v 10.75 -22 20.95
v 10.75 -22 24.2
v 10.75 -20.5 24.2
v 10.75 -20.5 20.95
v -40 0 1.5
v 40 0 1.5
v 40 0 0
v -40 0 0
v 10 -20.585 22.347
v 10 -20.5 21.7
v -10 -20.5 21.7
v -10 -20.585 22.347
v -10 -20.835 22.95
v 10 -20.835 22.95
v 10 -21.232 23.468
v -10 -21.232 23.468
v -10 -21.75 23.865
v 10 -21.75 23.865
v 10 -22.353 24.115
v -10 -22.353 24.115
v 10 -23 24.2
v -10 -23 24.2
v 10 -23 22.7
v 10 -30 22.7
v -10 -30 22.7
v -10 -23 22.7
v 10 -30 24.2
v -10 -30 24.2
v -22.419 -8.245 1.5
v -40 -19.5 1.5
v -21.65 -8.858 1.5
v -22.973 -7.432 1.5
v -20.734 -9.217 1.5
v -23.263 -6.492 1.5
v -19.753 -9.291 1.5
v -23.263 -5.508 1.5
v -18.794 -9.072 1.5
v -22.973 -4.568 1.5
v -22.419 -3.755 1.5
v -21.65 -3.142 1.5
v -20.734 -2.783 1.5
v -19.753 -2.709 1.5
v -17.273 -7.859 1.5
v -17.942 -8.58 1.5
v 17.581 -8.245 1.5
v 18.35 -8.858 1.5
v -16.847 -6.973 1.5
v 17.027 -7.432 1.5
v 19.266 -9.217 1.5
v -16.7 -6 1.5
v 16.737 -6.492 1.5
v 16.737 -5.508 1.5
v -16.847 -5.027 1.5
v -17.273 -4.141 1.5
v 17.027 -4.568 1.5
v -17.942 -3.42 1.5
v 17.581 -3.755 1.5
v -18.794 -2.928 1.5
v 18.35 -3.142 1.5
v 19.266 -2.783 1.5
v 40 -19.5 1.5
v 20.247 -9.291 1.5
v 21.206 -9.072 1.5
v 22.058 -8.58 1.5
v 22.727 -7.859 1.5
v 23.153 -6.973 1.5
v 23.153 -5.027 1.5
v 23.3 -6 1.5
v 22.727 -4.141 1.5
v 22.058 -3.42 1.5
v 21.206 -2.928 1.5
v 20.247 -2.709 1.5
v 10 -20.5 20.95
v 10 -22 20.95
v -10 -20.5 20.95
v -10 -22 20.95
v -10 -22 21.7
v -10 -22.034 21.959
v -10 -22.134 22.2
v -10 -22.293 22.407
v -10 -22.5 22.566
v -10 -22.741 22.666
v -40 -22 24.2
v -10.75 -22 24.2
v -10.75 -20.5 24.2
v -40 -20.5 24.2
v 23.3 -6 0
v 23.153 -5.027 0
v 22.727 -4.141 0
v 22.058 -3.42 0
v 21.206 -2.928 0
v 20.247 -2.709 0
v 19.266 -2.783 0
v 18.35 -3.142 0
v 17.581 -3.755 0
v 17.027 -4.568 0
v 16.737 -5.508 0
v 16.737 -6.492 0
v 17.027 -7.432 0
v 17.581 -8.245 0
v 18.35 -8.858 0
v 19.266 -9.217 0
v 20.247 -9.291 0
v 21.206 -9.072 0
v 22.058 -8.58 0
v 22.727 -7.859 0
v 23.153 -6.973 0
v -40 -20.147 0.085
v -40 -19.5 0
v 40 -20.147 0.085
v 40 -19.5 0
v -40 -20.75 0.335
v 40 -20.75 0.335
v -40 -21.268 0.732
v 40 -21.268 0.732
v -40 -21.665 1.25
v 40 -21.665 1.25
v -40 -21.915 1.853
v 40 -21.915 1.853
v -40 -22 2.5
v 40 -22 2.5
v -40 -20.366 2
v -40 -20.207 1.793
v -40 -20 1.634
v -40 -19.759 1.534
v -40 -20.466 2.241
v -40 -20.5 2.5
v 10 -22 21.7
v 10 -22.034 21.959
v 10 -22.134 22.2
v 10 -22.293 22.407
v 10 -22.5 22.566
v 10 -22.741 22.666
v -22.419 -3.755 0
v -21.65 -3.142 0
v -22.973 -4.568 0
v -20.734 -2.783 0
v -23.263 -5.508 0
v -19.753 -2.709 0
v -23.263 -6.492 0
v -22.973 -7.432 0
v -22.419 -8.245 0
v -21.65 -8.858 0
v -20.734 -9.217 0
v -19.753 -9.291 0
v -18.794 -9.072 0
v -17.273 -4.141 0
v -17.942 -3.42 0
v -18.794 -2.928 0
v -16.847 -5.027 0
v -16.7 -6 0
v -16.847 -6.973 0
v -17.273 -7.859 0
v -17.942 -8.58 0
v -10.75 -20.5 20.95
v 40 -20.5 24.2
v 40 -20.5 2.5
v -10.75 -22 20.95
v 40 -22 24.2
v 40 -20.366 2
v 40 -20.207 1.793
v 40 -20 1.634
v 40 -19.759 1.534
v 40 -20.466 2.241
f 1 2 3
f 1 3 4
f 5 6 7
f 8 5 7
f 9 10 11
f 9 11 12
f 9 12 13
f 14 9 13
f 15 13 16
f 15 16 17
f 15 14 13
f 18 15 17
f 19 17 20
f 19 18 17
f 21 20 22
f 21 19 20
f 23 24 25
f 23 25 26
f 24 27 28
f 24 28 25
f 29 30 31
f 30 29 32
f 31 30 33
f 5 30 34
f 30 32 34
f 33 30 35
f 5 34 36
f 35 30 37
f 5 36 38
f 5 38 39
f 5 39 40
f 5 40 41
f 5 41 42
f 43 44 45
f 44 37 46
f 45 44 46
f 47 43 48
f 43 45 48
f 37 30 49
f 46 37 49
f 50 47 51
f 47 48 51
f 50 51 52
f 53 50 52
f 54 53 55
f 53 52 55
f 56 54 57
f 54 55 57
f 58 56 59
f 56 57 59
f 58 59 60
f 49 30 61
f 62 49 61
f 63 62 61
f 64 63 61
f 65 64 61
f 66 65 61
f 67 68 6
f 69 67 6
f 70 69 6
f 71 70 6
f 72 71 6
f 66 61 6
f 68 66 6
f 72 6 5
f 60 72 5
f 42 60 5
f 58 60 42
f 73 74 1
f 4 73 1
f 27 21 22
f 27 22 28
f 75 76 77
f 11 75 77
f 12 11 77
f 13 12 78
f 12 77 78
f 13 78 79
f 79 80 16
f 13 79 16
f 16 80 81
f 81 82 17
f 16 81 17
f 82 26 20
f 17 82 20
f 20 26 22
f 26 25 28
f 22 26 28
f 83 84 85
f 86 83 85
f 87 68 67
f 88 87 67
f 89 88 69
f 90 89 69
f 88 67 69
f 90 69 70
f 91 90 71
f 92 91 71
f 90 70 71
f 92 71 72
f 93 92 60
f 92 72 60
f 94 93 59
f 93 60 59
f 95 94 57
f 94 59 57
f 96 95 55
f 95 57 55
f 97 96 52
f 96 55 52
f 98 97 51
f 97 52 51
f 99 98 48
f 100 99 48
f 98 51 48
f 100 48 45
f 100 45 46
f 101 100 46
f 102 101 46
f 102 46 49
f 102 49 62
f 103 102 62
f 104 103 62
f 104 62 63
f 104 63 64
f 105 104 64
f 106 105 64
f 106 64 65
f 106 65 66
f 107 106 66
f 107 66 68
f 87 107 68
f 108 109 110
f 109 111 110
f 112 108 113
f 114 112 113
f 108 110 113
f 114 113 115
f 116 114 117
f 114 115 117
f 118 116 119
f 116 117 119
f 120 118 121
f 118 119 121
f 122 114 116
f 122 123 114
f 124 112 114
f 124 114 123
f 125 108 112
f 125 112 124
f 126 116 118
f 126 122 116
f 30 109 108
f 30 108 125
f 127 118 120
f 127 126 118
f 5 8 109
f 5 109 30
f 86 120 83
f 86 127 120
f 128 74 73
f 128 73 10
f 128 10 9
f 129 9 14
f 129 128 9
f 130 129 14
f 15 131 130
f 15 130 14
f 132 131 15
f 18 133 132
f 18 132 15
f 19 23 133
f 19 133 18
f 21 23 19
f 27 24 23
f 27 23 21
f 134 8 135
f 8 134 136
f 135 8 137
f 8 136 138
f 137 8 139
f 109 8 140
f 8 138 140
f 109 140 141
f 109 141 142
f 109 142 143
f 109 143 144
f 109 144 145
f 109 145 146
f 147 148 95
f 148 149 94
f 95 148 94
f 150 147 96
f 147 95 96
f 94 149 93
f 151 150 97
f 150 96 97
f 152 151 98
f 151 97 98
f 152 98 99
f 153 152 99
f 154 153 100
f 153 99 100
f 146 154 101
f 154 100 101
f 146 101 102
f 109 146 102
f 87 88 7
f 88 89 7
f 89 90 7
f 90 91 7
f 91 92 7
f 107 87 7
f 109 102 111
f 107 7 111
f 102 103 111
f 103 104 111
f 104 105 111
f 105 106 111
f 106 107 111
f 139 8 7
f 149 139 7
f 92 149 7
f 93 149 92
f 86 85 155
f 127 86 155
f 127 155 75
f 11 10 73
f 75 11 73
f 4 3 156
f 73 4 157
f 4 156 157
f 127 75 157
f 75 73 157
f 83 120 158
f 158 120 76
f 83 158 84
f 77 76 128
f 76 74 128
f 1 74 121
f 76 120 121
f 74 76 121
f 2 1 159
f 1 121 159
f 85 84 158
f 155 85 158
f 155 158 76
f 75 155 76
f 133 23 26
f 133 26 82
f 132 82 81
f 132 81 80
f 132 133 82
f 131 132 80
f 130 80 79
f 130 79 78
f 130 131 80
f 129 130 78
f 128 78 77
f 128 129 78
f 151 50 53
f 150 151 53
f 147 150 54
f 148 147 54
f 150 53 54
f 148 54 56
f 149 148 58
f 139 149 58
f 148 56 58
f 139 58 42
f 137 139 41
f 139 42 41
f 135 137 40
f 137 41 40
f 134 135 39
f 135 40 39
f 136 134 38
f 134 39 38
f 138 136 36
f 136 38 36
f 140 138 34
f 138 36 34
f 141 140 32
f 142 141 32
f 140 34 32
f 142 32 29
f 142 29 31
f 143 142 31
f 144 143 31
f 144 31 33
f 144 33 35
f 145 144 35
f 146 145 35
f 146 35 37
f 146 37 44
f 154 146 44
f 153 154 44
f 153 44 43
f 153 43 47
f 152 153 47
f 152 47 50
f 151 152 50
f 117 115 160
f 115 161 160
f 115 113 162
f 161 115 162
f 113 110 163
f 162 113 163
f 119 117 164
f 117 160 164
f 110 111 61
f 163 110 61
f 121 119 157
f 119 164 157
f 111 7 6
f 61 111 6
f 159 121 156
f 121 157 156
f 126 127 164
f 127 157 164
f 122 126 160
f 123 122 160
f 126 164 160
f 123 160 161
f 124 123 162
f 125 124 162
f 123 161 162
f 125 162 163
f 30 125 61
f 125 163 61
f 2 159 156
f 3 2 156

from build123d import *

# Parameters (mm, degrees)
SM_BASE_FLANGE_1_DEPTH            = 40
SM_EDGE_FLANGE_1_STRIP_W          = 8
SM_EDGE_FLANGE_1_STRIP_H          = 1.5
SM_EDGE_FLANGE_1_STRIP_CUT_DEPTH  = 20
SM_EDGE_FLANGE_1_RELIEF_W         = 8.75
SM_EDGE_FLANGE_1_RELIEF_H         = 0.75
SM_EDGE_FLANGE_1_RELIEF_CUT_DEPTH = 1.5
SM_EDGE_FLANGE_1_DEPTH            = 20
HOLE_WIZARD_M6_1_D                = 6.6


# Sheet-metal steps are written as plain solids
with BuildPart() as part:
    # Sketch 1 → 基体-法兰1 (new, symmetric)
    with BuildSketch(Plane(origin=(0, 0, 0), x_dir=(0, 0, -1), z_dir=(1, 0, 0))):
        with BuildLine():
            Line((0, 0), (0, -19.5))
            ThreePointArc((0, -19.5), (-0.732233047, -21.267766953), (-2.5, -22))
            Line((-2.5, -22), (-24.2, -22))
            Line((-24.2, -22), (-24.2, -20.5))
            Line((-24.2, -20.5), (-2.5, -20.5))
            ThreePointArc((-2.5, -20.5), (-1.792893219, -20.207106781), (-1.5, -19.5))
            Line((-1.5, -19.5), (-1.5, 0))
            Line((-1.5, 0), (0, 0))
        make_face()
    extrude(amount=SM_BASE_FLANGE_1_DEPTH, both=True)

    # 边线-法兰1 strip (across the edge) → 边线-法兰1 strip cut (cut)
    with BuildSketch(Plane(origin=(10, -22, 24.2), x_dir=(0, 0, -1), z_dir=(-1, 0, 0))):
        with Locations((-1.5, -0.75)):
            Rectangle(SM_EDGE_FLANGE_1_STRIP_W, SM_EDGE_FLANGE_1_STRIP_H)
    extrude(amount=SM_EDGE_FLANGE_1_STRIP_CUT_DEPTH, mode=Mode.SUBTRACT)

    # 边线-法兰1 relief (on the sheet) → 边线-法兰1 relief cut (cut)
    with BuildSketch(Plane(origin=(10, -22, 21.7), x_dir=(0, 0, -1), z_dir=(0, -1, 0))):
        with Locations((-3.625, 0.375)):
            Rectangle(SM_EDGE_FLANGE_1_RELIEF_W, SM_EDGE_FLANGE_1_RELIEF_H)
        with Locations((-3.625, -20.375)):
            Rectangle(SM_EDGE_FLANGE_1_RELIEF_W, SM_EDGE_FLANGE_1_RELIEF_H)
    extrude(amount=-SM_EDGE_FLANGE_1_RELIEF_CUT_DEPTH, mode=Mode.SUBTRACT)

    # 边线-法兰1 section (across the edge) → 边线-法兰1 (add)
    with BuildSketch(Plane(origin=(10, -22, 24.2), x_dir=(0, 0, -1), z_dir=(-1, 0, 0))):
        with BuildLine():
            Line((0, 1), (0, 8))
            Line((0, 8), (1.5, 8))
            Line((1.5, 8), (1.5, 1))
            ThreePointArc((1.5, 1), (1.792893219, 0.292893219), (2.5, 0))
            Line((2.5, 0), (2.5, -1.5))
            ThreePointArc((2.5, -1.5), (0.732233047, -0.767766953), (0, 1))
        make_face()
    extrude(amount=SM_EDGE_FLANGE_1_DEPTH)

    # M6 间隙孔1 (through all)
    with Locations(Plane(origin=(0, 0, 0), x_dir=(-1, 0, 0), z_dir=(0, 0, -1))):
        with Locations((-20, -6), (20, -6)):
            Hole(HOLE_WIZARD_M6_1_D / 2)


solid = part.part
